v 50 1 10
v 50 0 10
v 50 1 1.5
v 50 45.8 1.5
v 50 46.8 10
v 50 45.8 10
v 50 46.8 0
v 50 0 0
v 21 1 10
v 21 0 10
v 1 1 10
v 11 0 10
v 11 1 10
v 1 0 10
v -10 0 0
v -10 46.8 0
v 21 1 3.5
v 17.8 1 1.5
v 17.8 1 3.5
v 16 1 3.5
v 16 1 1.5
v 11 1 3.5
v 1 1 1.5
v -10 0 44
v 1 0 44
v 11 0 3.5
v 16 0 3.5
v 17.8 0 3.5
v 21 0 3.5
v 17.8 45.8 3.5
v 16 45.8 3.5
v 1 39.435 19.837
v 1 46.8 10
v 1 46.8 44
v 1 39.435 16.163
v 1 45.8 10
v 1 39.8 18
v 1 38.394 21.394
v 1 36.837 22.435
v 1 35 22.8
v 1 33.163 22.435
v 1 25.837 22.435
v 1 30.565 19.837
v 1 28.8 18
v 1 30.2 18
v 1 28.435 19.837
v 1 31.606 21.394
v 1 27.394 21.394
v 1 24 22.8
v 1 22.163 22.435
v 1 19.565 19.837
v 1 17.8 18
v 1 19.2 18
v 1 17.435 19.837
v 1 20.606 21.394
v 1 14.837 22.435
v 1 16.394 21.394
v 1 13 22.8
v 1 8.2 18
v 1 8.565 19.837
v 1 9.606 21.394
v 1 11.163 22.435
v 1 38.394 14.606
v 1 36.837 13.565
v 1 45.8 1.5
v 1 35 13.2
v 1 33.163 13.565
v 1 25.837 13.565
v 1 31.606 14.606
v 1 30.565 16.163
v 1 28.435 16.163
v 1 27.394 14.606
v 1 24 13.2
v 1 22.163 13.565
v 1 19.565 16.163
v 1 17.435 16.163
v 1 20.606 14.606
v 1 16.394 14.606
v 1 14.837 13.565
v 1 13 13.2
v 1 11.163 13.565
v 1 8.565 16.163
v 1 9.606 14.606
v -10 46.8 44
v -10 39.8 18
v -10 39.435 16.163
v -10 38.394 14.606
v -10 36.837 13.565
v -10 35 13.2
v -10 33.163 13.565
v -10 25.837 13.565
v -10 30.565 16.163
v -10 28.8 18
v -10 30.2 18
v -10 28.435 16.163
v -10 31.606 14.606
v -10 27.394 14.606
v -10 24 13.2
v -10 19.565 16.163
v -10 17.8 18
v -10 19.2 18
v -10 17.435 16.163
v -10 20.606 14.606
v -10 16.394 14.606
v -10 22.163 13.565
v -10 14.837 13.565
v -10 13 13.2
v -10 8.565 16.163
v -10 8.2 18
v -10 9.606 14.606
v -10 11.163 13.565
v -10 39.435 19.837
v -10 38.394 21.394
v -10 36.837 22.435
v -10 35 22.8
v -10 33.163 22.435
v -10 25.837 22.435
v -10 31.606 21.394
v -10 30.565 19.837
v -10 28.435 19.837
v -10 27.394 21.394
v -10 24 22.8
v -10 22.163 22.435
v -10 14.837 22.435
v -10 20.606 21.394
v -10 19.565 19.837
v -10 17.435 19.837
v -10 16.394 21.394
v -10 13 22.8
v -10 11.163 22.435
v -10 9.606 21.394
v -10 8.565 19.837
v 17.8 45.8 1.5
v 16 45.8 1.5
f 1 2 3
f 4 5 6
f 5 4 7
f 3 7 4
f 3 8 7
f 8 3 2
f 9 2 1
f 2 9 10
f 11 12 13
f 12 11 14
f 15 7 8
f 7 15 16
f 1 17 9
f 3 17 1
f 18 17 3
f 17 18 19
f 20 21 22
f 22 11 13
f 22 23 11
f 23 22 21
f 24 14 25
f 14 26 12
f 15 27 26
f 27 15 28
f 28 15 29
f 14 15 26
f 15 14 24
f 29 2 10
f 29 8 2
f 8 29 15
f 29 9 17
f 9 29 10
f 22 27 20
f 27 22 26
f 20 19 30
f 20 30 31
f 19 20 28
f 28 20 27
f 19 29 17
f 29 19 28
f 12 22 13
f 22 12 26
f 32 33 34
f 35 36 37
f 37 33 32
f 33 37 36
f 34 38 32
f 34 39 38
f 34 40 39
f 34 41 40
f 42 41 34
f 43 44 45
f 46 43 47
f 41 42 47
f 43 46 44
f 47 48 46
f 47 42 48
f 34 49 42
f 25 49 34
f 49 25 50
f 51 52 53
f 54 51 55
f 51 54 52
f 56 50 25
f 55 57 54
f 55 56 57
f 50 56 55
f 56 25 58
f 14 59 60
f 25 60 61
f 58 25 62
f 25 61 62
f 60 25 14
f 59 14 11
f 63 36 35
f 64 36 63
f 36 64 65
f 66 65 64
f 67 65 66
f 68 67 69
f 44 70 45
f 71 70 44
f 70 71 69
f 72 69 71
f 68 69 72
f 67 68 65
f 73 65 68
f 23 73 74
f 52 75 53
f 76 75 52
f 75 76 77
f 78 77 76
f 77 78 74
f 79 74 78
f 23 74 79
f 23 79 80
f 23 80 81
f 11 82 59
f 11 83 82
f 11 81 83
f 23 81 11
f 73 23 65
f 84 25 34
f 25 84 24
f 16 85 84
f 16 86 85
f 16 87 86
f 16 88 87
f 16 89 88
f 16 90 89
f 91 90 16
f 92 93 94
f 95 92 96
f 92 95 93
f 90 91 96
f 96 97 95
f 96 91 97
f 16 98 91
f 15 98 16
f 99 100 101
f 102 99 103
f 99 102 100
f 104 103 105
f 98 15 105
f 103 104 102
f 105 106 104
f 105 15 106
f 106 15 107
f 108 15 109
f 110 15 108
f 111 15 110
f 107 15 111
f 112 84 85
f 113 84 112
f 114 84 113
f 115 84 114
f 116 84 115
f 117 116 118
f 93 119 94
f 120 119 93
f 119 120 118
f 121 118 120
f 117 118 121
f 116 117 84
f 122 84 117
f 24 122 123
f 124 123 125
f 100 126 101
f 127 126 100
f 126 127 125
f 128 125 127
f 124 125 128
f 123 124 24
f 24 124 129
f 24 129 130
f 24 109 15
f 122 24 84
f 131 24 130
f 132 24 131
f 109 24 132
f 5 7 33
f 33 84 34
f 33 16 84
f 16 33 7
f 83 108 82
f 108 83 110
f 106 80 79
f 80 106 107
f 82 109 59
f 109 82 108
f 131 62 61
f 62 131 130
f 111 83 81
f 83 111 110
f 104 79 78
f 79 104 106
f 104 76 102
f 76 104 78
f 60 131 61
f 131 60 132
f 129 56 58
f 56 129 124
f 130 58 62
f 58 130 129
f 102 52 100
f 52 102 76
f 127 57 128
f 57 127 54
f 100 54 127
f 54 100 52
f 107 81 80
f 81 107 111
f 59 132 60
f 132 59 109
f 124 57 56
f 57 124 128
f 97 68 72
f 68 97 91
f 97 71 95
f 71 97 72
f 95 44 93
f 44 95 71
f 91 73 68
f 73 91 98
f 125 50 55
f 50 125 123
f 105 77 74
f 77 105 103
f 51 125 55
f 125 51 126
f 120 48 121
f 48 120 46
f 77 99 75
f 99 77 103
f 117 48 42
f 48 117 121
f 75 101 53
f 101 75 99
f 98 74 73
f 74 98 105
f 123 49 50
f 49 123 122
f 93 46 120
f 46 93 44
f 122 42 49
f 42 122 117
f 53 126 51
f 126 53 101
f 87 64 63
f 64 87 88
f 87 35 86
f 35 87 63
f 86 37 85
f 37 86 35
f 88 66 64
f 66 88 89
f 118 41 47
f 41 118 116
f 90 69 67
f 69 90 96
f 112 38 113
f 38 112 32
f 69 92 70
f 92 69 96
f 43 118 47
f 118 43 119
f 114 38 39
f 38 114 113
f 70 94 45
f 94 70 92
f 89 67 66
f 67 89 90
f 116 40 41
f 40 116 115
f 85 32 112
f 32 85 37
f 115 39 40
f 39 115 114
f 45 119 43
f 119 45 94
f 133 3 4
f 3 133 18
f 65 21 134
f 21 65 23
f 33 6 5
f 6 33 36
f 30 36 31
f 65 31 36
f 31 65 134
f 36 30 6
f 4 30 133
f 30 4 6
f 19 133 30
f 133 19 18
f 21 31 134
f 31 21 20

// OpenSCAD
union() {
	union() {
		cube([50, 46.8, 1.5], 0);
		difference() {
		cube([50, 1.0, 10], 0);
		translate([11.0, -1.0, 3.5]) {
		cube([10, 3.0, 10]);
		}
}
		translate([0, 45.8, 0]) {
			cube([50, 1.0, 10], 0);
		}
		difference() {
		translate([-10.0, 0, 0]) {
			cube([11.0, 46.8, 44], 0);
		}
		rotate([0, 90, 0]) {
			translate([-18.0, 13.0, -10.0]) {
			cylinder(h=12, d=9.6, $fa=6);
}
		}
rotate([0, 90, 0]) {
			translate([-18.0, 24.0, -10.0]) {
			cylinder(h=12, d=9.6, $fa=6);
}
		}
rotate([0, 90, 0]) {
			translate([-18.0, 35.0, -10.0]) {
			cylinder(h=12, d=9.6, $fa=6);
}
		}
		}
	}
	translate([16.0, 0, 1.5]) {
		cube([1.8, 46.8, 2.0], 0);
	}
}
